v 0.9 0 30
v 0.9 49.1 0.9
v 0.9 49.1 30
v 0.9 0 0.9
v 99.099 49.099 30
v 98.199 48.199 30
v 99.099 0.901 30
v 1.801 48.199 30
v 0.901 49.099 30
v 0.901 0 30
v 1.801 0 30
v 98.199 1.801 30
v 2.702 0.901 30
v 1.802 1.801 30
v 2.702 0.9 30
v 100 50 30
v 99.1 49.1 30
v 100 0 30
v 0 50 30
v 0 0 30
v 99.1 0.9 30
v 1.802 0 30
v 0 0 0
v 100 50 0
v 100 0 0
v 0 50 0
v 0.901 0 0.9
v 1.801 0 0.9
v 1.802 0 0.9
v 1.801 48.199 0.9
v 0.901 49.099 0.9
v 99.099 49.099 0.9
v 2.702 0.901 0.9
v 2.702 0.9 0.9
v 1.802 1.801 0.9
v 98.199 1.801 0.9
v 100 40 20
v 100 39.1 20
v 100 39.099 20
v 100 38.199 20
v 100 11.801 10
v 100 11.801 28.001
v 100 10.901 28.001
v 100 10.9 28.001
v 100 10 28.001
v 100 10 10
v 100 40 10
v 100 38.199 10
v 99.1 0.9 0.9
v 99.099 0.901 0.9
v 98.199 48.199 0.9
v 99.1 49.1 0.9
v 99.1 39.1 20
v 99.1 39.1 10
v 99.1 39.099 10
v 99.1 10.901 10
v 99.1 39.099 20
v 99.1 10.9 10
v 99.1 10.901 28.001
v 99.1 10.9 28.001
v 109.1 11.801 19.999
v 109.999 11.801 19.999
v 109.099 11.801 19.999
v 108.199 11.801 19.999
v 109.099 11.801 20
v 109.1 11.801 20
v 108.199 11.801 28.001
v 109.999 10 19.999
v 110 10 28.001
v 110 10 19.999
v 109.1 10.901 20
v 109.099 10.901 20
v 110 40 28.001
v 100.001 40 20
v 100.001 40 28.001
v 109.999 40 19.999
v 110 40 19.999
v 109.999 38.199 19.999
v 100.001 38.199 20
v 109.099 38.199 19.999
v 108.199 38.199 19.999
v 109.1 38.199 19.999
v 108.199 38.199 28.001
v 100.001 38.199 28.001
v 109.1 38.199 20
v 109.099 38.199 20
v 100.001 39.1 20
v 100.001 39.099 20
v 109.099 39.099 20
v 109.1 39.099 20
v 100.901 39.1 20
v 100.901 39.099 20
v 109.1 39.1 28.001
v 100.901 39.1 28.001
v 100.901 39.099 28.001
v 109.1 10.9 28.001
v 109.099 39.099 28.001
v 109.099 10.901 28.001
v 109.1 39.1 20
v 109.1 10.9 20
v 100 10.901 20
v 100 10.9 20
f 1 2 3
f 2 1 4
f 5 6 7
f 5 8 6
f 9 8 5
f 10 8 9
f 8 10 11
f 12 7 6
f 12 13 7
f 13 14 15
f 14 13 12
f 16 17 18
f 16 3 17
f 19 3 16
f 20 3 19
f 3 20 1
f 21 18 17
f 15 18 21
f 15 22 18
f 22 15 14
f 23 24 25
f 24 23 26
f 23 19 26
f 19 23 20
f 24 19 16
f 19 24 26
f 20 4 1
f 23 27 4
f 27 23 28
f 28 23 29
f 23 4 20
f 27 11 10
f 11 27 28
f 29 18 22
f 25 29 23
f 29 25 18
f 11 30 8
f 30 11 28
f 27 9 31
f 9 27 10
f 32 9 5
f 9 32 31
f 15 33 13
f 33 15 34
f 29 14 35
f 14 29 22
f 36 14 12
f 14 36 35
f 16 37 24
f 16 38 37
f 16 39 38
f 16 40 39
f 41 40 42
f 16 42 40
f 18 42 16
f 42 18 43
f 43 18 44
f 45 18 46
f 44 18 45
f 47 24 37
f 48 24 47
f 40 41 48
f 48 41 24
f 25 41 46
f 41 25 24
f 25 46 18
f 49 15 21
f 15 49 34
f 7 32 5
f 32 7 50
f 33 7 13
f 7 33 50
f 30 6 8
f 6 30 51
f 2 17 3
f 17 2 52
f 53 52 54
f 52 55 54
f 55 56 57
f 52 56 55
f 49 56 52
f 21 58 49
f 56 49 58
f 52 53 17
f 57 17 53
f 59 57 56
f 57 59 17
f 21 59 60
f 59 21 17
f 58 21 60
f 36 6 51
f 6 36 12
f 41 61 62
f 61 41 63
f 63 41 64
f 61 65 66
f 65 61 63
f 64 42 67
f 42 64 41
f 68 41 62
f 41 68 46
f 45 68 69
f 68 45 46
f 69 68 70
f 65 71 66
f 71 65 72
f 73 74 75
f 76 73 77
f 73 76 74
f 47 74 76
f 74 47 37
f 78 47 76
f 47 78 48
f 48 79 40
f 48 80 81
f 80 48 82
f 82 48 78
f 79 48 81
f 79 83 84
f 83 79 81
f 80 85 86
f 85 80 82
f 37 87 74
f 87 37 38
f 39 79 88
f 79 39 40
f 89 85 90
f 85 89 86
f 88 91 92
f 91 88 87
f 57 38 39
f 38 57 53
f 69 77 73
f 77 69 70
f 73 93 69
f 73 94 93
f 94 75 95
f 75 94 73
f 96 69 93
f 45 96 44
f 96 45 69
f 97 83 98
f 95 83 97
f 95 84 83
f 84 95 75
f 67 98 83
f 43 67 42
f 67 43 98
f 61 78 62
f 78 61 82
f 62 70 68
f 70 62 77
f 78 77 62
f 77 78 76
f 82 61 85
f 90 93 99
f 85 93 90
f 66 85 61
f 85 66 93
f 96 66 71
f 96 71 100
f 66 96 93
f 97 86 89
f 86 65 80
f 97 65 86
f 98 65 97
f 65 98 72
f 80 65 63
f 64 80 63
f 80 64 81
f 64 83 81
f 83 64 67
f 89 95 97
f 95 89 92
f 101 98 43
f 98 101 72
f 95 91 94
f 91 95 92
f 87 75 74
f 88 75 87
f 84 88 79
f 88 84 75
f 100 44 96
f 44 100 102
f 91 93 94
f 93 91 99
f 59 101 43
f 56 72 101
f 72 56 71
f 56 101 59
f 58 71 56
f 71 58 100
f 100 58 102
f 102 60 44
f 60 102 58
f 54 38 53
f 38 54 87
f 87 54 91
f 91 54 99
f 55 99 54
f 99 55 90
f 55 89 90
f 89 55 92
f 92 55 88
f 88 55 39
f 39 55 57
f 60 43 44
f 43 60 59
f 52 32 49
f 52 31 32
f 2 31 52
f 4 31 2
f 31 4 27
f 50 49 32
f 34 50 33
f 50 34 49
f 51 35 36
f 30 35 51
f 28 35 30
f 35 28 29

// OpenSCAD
size=[100,50,30];
holder=[10,30,8,10];
thread=0.45;

not=0.001;

vaseFloor([size.x,size.y,2*thread]);
cubeHolderVase4(size,holder,thread);


module cubeVase4(size=[10,10,10],thread=0.45,gap=0.001){
	t2=2*thread;
	t2g=t2+gap;
	
	cube([t2,size.y,size.z]);
	t([t2g,0,0]) cube([2*thread,size.y-t2g,size.z]);
	t([2*t2g,0,0]) cube([t2,t2g+t2,size.z]);

	t([2*t2g,0,0]) cube([size.x-2*t2g,2*thread,size.z]);
	t([2*t2g,t2g,0]) cube([size.x-3*t2g,2*thread,size.z]);
	t([t2g,size.y-t2-t2g,0]) cube([size.x-2*t2g,t2,size.z]);
	t([0,size.y-t2,0]) cube([size.x,t2,size.z]);

	t([size.x-t2,0,0]) cube([t2,size.y,size.z]);
	t([size.x-t2g-t2,t2g,0]) cube([t2,size.y-2*t2g,size.z]);	
}

module triangle(w=1){
	linear_extrude(w) polygon([[0,0],[0,holder.x],[holder.x,holder.x]]);
}

/// 2 wall cube without bottom or ceiling
module cubeHolderVase4(size=[10,10,10],holder=[5,10,3,2],thread=0.45,gap=0.001){
	tg=thread+gap;
	shift=(size.y-holder.y)/2;
	t2=2*thread;
	t2g=t2+gap;
	
	difference(){
		u(){
			cubeVase4(size,thread,gap);
		
			///support holder
			for(y=[shift,size.y-shift-4*thread-gap]){
				t([size.x,y,holder[3]]) rt([90,0,0],[0,0,0],[0,0,-(4*thread+gap)])triangle(4*thread+gap);
			}
			
			///holder
			t([size.x+holder.x-t2,shift,holder[3]+holder.x-not]) cube([t2,holder.y,holder.z+2*not]);
			t([size.x+holder.x-2*t2-gap,shift+t2g,holder[3]+holder.x-not]) cube([t2,holder.y-2*t2g,holder.z+2*not]);
			t([size.x+gap,shift+holder.y-t2g-t2,holder[3]+holder.x-not]) cube([t2,t2g+t2,holder.z+2*not]);
			
			t([size.x,shift,holder[3]+holder.x-not]) cube([holder.x,t2,holder.z+2*not]);
			t([size.x,shift+t2g,holder[3]+holder.x-not]) cube([holder.x-t2g,t2,holder.z+2*not]);
			t([size.x+t2g,shift+holder.y-t2g-t2,holder[3]+holder.x-not]) cube([holder.x-2*t2g,t2,holder.z+2*not]);
			t([size.x+t2g,shift+holder.y-t2,holder[3]+holder.x-not]) cube([holder.x-t2g,t2,holder.z+2*not]);
			
		}

		///support
		for(y=[shift+2*thread,size.y-shift-2*thread-gap]){
			t([size.x-2*thread,y,holder[3]]) rt([90,0,0],[0,0,0],[0,0,-gap])triangle(gap);
		}
		
		///holder
		t([size.x-2*thread,shift+2*thread,holder[3]+holder.x-not]) cube([2*thread,gap,holder.z+2*not]);
	}
	
	//holder
//	t([0,0,holder[3]]) difference(){
//		t([size.x,shift,holder.x]) cube([holder.x,holder.y,holder.z]);
//		t([size.x,shift+2*thread,holder.x-not]) cube([holder.x-2*thread,holder.y-4*thread,holder.z+2*not]);
//	}
}

module vaseFloor(size=[10,10,2]){
	cube(size);
}

module t(v=[0,0,0]){translate(v) children();}
module r(a=[0,0,0],rp=[0,0,0]){translate(rp) rotate(a) translate(-rp) children();}
module tr(v=[0,0,0],a=[0,0,0],rp=[0,0,0]){t(v) r(a,rp) children();}
module rt(a=[0,0,0],rp=[0,0,0],v=[0,0,0]){r(a,rp) t(v) children();}
module u(){union() children();}
